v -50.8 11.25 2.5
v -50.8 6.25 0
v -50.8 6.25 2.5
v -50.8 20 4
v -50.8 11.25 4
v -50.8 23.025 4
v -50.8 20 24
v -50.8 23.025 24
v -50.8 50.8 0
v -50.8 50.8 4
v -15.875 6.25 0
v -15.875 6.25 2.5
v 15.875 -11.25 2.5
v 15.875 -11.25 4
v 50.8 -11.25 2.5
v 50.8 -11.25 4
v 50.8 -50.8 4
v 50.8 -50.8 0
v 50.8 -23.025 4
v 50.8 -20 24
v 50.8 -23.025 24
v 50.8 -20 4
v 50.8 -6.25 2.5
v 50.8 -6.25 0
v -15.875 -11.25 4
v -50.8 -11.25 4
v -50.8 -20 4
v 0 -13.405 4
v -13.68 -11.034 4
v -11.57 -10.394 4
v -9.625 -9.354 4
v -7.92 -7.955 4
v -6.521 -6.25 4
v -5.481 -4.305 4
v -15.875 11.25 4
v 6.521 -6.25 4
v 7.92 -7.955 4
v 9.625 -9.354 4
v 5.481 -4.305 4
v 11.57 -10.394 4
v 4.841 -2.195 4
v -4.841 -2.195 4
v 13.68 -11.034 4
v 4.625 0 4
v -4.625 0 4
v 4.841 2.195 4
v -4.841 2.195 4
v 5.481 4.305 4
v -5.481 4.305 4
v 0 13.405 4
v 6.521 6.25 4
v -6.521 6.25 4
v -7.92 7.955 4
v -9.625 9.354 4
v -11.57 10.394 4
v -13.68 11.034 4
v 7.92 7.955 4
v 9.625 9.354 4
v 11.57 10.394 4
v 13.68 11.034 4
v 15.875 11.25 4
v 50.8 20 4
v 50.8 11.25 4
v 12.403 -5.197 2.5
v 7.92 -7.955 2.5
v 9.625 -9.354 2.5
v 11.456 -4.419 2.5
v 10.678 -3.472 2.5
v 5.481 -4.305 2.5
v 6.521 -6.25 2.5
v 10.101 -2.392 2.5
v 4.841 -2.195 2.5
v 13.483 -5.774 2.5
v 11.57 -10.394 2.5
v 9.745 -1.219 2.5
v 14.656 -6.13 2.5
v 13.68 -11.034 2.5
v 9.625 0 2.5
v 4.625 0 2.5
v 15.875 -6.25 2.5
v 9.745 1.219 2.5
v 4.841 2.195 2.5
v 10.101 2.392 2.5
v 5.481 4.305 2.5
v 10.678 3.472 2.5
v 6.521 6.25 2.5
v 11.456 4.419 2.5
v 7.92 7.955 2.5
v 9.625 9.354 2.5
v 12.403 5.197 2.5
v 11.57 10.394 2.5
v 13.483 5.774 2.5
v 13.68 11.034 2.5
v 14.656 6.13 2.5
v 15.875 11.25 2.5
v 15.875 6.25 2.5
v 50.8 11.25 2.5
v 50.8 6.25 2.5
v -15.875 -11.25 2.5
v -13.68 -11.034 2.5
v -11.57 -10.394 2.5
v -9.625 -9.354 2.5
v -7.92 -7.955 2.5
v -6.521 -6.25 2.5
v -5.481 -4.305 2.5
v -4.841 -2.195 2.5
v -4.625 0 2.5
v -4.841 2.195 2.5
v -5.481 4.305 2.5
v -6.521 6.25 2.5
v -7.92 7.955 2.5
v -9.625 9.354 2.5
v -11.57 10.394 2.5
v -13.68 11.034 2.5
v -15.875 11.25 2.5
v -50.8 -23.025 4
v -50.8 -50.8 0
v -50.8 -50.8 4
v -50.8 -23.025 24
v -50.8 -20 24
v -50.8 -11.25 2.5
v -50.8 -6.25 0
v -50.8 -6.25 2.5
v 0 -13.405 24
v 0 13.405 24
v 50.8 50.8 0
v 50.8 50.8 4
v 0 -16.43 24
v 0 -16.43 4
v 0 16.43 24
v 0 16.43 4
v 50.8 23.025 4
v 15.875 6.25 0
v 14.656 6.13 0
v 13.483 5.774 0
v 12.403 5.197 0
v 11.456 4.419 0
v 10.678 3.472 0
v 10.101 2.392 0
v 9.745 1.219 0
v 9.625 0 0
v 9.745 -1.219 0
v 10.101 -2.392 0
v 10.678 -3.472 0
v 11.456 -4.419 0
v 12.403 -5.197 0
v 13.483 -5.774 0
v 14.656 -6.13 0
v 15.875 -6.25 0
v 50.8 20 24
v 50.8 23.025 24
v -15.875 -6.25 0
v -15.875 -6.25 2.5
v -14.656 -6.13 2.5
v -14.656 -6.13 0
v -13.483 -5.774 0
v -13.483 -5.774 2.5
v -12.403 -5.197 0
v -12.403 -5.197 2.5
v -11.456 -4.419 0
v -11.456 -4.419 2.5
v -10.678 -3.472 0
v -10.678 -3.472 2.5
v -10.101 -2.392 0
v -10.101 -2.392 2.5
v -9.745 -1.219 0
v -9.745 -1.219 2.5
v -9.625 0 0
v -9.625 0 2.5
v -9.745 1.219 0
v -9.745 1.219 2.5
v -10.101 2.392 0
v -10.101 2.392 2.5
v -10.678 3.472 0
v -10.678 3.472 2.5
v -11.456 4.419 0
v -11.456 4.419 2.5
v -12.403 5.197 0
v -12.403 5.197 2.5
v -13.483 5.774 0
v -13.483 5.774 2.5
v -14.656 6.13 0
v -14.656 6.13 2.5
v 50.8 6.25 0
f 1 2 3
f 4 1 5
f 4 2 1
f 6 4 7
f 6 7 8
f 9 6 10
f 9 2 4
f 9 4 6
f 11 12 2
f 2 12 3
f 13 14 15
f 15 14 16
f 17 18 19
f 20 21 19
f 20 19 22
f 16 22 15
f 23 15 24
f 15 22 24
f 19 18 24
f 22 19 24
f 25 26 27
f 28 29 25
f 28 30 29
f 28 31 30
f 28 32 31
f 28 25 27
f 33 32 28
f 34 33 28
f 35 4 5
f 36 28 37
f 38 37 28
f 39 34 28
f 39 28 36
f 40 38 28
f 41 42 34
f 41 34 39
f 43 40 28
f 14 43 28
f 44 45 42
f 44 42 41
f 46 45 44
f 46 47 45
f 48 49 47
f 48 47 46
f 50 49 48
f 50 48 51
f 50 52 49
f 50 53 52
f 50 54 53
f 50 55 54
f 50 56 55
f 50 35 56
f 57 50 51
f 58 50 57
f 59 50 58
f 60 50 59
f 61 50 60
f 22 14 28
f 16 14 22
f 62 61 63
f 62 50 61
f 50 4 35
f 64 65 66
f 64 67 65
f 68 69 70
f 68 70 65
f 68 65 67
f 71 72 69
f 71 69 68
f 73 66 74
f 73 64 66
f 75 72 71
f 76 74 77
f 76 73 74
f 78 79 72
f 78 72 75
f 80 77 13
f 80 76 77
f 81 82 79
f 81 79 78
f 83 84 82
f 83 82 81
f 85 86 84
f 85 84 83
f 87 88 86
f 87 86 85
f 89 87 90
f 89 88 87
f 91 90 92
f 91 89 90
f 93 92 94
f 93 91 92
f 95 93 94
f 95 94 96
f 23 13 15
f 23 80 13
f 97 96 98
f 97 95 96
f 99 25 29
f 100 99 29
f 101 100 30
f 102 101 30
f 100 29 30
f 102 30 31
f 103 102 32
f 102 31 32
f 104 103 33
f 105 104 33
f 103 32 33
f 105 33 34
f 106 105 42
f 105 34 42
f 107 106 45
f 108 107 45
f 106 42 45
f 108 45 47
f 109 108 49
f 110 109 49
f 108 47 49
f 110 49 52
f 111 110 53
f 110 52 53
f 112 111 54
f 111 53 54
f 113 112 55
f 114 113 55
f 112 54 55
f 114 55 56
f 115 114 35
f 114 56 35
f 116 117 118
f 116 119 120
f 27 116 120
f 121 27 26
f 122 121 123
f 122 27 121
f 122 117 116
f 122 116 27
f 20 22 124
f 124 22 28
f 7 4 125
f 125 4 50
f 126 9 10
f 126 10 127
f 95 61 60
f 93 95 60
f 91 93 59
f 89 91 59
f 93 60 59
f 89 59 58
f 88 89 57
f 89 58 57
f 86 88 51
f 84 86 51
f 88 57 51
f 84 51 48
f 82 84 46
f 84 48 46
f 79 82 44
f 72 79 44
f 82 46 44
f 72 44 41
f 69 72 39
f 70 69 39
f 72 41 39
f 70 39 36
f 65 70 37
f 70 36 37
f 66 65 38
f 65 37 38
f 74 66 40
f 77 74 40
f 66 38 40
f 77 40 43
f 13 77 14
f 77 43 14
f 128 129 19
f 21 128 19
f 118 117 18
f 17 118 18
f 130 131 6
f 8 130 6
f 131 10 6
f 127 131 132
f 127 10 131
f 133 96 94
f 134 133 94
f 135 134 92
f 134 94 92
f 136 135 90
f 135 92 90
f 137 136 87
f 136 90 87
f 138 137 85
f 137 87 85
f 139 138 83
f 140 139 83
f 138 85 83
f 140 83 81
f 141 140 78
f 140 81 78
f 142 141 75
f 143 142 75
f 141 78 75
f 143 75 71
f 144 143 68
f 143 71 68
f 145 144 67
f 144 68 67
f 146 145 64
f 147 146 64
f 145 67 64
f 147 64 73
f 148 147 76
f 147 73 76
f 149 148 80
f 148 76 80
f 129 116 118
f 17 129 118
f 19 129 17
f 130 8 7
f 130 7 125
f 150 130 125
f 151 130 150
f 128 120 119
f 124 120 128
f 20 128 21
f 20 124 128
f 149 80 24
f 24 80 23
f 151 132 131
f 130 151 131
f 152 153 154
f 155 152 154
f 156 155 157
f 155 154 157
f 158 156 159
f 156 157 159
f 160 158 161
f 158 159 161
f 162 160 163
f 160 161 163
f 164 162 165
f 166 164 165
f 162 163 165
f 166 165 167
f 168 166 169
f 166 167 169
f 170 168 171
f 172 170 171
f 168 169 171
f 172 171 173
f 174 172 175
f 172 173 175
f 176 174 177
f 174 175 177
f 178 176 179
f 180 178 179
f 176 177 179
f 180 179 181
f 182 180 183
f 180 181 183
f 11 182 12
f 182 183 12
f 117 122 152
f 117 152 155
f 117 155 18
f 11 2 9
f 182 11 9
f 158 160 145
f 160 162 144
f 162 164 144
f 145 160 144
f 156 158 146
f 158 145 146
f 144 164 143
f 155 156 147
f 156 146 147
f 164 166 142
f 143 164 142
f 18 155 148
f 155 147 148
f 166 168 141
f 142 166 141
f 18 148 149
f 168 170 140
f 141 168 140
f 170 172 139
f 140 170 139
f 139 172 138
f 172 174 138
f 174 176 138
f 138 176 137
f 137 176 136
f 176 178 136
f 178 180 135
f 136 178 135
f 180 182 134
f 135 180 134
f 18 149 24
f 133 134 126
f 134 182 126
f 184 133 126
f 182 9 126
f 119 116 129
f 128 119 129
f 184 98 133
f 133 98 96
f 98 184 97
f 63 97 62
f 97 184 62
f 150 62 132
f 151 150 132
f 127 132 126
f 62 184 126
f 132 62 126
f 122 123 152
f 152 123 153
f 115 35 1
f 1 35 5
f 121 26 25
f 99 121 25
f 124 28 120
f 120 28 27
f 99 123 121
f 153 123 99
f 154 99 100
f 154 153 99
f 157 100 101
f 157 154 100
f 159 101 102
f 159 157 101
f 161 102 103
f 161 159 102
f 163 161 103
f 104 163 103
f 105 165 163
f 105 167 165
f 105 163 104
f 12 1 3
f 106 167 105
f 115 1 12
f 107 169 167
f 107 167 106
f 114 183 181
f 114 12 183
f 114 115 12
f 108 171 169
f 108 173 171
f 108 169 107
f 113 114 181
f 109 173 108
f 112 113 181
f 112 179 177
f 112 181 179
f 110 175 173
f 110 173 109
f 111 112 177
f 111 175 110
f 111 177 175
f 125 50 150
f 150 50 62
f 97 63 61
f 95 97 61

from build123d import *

# Parameters (mm, degrees)
F0_W     = 101.6
F0_H     = 101.6
F1_DEPTH = 4
F3_DEPTH = 1.5
F5_DEPTH = 25.4
F7_DEPTH = 20


with BuildPart() as f1:
    # F0 (on Top) → F1 (new body)
    with BuildSketch(Plane.XY):
        Rectangle(F0_W, F0_H)
    extrude(amount=F1_DEPTH)

    # F2 (on face) → F3 (cut)
    with BuildSketch(Plane.XY.offset(4)):
        with BuildLine():
            Line((15.875, -11.25), (50.8, -11.25))
            Line((50.8, -11.25), (50.8, 11.25))
            Line((50.8, 11.25), (15.875, 11.25))
            ThreePointArc((15.875, 11.25), (4.625, 0), (15.875, -11.25))
        make_face()
        with BuildLine():
            Line((-50.8, -11.25), (-15.875, -11.25))
            ThreePointArc((-15.875, -11.25), (-4.625, 0), (-15.875, 11.25))
            Line((-15.875, 11.25), (-50.8, 11.25))
            Line((-50.8, 11.25), (-50.8, -11.25))
        make_face()
    extrude(amount=-F3_DEPTH, mode=Mode.SUBTRACT)

    # F4 (on face) → F5 (cut)
    with BuildSketch(Plane.XY.offset(2.5)):
        with BuildLine():
            ThreePointArc((-15.875, -6.25), (-9.625, 0), (-15.875, 6.25))
            Line((-15.875, 6.25), (-50.8, 6.25))
            Line((-50.8, 6.25), (-50.8, -6.25))
            Line((-50.8, -6.25), (-15.875, -6.25))
        make_face()
        with BuildLine():
            ThreePointArc((15.875, 6.25), (9.625, 0), (15.875, -6.25))
            Line((15.875, -6.25), (50.8, -6.25))
            Line((50.8, -6.25), (50.8, 6.25))
            Line((50.8, 6.25), (15.875, 6.25))
        make_face()
    extrude(amount=-F5_DEPTH, mode=Mode.SUBTRACT)

    # F6 (on face) → F7 (join)
    with BuildSketch(Plane.XY.offset(4)):
        Polygon((0, -13.405257), (-50.8, -20), (-50.8, -23.025173), (0, -16.430431), (50.8, -23.025173), (50.8, -20), align=None)
        Polygon((-50.8, 23.025173), (-50.8, 20), (0, 13.405257), (50.8, 20), (50.8, 23.025173), (0, 16.430431), align=None)
    extrude(amount=F7_DEPTH)


solid = f1.part
